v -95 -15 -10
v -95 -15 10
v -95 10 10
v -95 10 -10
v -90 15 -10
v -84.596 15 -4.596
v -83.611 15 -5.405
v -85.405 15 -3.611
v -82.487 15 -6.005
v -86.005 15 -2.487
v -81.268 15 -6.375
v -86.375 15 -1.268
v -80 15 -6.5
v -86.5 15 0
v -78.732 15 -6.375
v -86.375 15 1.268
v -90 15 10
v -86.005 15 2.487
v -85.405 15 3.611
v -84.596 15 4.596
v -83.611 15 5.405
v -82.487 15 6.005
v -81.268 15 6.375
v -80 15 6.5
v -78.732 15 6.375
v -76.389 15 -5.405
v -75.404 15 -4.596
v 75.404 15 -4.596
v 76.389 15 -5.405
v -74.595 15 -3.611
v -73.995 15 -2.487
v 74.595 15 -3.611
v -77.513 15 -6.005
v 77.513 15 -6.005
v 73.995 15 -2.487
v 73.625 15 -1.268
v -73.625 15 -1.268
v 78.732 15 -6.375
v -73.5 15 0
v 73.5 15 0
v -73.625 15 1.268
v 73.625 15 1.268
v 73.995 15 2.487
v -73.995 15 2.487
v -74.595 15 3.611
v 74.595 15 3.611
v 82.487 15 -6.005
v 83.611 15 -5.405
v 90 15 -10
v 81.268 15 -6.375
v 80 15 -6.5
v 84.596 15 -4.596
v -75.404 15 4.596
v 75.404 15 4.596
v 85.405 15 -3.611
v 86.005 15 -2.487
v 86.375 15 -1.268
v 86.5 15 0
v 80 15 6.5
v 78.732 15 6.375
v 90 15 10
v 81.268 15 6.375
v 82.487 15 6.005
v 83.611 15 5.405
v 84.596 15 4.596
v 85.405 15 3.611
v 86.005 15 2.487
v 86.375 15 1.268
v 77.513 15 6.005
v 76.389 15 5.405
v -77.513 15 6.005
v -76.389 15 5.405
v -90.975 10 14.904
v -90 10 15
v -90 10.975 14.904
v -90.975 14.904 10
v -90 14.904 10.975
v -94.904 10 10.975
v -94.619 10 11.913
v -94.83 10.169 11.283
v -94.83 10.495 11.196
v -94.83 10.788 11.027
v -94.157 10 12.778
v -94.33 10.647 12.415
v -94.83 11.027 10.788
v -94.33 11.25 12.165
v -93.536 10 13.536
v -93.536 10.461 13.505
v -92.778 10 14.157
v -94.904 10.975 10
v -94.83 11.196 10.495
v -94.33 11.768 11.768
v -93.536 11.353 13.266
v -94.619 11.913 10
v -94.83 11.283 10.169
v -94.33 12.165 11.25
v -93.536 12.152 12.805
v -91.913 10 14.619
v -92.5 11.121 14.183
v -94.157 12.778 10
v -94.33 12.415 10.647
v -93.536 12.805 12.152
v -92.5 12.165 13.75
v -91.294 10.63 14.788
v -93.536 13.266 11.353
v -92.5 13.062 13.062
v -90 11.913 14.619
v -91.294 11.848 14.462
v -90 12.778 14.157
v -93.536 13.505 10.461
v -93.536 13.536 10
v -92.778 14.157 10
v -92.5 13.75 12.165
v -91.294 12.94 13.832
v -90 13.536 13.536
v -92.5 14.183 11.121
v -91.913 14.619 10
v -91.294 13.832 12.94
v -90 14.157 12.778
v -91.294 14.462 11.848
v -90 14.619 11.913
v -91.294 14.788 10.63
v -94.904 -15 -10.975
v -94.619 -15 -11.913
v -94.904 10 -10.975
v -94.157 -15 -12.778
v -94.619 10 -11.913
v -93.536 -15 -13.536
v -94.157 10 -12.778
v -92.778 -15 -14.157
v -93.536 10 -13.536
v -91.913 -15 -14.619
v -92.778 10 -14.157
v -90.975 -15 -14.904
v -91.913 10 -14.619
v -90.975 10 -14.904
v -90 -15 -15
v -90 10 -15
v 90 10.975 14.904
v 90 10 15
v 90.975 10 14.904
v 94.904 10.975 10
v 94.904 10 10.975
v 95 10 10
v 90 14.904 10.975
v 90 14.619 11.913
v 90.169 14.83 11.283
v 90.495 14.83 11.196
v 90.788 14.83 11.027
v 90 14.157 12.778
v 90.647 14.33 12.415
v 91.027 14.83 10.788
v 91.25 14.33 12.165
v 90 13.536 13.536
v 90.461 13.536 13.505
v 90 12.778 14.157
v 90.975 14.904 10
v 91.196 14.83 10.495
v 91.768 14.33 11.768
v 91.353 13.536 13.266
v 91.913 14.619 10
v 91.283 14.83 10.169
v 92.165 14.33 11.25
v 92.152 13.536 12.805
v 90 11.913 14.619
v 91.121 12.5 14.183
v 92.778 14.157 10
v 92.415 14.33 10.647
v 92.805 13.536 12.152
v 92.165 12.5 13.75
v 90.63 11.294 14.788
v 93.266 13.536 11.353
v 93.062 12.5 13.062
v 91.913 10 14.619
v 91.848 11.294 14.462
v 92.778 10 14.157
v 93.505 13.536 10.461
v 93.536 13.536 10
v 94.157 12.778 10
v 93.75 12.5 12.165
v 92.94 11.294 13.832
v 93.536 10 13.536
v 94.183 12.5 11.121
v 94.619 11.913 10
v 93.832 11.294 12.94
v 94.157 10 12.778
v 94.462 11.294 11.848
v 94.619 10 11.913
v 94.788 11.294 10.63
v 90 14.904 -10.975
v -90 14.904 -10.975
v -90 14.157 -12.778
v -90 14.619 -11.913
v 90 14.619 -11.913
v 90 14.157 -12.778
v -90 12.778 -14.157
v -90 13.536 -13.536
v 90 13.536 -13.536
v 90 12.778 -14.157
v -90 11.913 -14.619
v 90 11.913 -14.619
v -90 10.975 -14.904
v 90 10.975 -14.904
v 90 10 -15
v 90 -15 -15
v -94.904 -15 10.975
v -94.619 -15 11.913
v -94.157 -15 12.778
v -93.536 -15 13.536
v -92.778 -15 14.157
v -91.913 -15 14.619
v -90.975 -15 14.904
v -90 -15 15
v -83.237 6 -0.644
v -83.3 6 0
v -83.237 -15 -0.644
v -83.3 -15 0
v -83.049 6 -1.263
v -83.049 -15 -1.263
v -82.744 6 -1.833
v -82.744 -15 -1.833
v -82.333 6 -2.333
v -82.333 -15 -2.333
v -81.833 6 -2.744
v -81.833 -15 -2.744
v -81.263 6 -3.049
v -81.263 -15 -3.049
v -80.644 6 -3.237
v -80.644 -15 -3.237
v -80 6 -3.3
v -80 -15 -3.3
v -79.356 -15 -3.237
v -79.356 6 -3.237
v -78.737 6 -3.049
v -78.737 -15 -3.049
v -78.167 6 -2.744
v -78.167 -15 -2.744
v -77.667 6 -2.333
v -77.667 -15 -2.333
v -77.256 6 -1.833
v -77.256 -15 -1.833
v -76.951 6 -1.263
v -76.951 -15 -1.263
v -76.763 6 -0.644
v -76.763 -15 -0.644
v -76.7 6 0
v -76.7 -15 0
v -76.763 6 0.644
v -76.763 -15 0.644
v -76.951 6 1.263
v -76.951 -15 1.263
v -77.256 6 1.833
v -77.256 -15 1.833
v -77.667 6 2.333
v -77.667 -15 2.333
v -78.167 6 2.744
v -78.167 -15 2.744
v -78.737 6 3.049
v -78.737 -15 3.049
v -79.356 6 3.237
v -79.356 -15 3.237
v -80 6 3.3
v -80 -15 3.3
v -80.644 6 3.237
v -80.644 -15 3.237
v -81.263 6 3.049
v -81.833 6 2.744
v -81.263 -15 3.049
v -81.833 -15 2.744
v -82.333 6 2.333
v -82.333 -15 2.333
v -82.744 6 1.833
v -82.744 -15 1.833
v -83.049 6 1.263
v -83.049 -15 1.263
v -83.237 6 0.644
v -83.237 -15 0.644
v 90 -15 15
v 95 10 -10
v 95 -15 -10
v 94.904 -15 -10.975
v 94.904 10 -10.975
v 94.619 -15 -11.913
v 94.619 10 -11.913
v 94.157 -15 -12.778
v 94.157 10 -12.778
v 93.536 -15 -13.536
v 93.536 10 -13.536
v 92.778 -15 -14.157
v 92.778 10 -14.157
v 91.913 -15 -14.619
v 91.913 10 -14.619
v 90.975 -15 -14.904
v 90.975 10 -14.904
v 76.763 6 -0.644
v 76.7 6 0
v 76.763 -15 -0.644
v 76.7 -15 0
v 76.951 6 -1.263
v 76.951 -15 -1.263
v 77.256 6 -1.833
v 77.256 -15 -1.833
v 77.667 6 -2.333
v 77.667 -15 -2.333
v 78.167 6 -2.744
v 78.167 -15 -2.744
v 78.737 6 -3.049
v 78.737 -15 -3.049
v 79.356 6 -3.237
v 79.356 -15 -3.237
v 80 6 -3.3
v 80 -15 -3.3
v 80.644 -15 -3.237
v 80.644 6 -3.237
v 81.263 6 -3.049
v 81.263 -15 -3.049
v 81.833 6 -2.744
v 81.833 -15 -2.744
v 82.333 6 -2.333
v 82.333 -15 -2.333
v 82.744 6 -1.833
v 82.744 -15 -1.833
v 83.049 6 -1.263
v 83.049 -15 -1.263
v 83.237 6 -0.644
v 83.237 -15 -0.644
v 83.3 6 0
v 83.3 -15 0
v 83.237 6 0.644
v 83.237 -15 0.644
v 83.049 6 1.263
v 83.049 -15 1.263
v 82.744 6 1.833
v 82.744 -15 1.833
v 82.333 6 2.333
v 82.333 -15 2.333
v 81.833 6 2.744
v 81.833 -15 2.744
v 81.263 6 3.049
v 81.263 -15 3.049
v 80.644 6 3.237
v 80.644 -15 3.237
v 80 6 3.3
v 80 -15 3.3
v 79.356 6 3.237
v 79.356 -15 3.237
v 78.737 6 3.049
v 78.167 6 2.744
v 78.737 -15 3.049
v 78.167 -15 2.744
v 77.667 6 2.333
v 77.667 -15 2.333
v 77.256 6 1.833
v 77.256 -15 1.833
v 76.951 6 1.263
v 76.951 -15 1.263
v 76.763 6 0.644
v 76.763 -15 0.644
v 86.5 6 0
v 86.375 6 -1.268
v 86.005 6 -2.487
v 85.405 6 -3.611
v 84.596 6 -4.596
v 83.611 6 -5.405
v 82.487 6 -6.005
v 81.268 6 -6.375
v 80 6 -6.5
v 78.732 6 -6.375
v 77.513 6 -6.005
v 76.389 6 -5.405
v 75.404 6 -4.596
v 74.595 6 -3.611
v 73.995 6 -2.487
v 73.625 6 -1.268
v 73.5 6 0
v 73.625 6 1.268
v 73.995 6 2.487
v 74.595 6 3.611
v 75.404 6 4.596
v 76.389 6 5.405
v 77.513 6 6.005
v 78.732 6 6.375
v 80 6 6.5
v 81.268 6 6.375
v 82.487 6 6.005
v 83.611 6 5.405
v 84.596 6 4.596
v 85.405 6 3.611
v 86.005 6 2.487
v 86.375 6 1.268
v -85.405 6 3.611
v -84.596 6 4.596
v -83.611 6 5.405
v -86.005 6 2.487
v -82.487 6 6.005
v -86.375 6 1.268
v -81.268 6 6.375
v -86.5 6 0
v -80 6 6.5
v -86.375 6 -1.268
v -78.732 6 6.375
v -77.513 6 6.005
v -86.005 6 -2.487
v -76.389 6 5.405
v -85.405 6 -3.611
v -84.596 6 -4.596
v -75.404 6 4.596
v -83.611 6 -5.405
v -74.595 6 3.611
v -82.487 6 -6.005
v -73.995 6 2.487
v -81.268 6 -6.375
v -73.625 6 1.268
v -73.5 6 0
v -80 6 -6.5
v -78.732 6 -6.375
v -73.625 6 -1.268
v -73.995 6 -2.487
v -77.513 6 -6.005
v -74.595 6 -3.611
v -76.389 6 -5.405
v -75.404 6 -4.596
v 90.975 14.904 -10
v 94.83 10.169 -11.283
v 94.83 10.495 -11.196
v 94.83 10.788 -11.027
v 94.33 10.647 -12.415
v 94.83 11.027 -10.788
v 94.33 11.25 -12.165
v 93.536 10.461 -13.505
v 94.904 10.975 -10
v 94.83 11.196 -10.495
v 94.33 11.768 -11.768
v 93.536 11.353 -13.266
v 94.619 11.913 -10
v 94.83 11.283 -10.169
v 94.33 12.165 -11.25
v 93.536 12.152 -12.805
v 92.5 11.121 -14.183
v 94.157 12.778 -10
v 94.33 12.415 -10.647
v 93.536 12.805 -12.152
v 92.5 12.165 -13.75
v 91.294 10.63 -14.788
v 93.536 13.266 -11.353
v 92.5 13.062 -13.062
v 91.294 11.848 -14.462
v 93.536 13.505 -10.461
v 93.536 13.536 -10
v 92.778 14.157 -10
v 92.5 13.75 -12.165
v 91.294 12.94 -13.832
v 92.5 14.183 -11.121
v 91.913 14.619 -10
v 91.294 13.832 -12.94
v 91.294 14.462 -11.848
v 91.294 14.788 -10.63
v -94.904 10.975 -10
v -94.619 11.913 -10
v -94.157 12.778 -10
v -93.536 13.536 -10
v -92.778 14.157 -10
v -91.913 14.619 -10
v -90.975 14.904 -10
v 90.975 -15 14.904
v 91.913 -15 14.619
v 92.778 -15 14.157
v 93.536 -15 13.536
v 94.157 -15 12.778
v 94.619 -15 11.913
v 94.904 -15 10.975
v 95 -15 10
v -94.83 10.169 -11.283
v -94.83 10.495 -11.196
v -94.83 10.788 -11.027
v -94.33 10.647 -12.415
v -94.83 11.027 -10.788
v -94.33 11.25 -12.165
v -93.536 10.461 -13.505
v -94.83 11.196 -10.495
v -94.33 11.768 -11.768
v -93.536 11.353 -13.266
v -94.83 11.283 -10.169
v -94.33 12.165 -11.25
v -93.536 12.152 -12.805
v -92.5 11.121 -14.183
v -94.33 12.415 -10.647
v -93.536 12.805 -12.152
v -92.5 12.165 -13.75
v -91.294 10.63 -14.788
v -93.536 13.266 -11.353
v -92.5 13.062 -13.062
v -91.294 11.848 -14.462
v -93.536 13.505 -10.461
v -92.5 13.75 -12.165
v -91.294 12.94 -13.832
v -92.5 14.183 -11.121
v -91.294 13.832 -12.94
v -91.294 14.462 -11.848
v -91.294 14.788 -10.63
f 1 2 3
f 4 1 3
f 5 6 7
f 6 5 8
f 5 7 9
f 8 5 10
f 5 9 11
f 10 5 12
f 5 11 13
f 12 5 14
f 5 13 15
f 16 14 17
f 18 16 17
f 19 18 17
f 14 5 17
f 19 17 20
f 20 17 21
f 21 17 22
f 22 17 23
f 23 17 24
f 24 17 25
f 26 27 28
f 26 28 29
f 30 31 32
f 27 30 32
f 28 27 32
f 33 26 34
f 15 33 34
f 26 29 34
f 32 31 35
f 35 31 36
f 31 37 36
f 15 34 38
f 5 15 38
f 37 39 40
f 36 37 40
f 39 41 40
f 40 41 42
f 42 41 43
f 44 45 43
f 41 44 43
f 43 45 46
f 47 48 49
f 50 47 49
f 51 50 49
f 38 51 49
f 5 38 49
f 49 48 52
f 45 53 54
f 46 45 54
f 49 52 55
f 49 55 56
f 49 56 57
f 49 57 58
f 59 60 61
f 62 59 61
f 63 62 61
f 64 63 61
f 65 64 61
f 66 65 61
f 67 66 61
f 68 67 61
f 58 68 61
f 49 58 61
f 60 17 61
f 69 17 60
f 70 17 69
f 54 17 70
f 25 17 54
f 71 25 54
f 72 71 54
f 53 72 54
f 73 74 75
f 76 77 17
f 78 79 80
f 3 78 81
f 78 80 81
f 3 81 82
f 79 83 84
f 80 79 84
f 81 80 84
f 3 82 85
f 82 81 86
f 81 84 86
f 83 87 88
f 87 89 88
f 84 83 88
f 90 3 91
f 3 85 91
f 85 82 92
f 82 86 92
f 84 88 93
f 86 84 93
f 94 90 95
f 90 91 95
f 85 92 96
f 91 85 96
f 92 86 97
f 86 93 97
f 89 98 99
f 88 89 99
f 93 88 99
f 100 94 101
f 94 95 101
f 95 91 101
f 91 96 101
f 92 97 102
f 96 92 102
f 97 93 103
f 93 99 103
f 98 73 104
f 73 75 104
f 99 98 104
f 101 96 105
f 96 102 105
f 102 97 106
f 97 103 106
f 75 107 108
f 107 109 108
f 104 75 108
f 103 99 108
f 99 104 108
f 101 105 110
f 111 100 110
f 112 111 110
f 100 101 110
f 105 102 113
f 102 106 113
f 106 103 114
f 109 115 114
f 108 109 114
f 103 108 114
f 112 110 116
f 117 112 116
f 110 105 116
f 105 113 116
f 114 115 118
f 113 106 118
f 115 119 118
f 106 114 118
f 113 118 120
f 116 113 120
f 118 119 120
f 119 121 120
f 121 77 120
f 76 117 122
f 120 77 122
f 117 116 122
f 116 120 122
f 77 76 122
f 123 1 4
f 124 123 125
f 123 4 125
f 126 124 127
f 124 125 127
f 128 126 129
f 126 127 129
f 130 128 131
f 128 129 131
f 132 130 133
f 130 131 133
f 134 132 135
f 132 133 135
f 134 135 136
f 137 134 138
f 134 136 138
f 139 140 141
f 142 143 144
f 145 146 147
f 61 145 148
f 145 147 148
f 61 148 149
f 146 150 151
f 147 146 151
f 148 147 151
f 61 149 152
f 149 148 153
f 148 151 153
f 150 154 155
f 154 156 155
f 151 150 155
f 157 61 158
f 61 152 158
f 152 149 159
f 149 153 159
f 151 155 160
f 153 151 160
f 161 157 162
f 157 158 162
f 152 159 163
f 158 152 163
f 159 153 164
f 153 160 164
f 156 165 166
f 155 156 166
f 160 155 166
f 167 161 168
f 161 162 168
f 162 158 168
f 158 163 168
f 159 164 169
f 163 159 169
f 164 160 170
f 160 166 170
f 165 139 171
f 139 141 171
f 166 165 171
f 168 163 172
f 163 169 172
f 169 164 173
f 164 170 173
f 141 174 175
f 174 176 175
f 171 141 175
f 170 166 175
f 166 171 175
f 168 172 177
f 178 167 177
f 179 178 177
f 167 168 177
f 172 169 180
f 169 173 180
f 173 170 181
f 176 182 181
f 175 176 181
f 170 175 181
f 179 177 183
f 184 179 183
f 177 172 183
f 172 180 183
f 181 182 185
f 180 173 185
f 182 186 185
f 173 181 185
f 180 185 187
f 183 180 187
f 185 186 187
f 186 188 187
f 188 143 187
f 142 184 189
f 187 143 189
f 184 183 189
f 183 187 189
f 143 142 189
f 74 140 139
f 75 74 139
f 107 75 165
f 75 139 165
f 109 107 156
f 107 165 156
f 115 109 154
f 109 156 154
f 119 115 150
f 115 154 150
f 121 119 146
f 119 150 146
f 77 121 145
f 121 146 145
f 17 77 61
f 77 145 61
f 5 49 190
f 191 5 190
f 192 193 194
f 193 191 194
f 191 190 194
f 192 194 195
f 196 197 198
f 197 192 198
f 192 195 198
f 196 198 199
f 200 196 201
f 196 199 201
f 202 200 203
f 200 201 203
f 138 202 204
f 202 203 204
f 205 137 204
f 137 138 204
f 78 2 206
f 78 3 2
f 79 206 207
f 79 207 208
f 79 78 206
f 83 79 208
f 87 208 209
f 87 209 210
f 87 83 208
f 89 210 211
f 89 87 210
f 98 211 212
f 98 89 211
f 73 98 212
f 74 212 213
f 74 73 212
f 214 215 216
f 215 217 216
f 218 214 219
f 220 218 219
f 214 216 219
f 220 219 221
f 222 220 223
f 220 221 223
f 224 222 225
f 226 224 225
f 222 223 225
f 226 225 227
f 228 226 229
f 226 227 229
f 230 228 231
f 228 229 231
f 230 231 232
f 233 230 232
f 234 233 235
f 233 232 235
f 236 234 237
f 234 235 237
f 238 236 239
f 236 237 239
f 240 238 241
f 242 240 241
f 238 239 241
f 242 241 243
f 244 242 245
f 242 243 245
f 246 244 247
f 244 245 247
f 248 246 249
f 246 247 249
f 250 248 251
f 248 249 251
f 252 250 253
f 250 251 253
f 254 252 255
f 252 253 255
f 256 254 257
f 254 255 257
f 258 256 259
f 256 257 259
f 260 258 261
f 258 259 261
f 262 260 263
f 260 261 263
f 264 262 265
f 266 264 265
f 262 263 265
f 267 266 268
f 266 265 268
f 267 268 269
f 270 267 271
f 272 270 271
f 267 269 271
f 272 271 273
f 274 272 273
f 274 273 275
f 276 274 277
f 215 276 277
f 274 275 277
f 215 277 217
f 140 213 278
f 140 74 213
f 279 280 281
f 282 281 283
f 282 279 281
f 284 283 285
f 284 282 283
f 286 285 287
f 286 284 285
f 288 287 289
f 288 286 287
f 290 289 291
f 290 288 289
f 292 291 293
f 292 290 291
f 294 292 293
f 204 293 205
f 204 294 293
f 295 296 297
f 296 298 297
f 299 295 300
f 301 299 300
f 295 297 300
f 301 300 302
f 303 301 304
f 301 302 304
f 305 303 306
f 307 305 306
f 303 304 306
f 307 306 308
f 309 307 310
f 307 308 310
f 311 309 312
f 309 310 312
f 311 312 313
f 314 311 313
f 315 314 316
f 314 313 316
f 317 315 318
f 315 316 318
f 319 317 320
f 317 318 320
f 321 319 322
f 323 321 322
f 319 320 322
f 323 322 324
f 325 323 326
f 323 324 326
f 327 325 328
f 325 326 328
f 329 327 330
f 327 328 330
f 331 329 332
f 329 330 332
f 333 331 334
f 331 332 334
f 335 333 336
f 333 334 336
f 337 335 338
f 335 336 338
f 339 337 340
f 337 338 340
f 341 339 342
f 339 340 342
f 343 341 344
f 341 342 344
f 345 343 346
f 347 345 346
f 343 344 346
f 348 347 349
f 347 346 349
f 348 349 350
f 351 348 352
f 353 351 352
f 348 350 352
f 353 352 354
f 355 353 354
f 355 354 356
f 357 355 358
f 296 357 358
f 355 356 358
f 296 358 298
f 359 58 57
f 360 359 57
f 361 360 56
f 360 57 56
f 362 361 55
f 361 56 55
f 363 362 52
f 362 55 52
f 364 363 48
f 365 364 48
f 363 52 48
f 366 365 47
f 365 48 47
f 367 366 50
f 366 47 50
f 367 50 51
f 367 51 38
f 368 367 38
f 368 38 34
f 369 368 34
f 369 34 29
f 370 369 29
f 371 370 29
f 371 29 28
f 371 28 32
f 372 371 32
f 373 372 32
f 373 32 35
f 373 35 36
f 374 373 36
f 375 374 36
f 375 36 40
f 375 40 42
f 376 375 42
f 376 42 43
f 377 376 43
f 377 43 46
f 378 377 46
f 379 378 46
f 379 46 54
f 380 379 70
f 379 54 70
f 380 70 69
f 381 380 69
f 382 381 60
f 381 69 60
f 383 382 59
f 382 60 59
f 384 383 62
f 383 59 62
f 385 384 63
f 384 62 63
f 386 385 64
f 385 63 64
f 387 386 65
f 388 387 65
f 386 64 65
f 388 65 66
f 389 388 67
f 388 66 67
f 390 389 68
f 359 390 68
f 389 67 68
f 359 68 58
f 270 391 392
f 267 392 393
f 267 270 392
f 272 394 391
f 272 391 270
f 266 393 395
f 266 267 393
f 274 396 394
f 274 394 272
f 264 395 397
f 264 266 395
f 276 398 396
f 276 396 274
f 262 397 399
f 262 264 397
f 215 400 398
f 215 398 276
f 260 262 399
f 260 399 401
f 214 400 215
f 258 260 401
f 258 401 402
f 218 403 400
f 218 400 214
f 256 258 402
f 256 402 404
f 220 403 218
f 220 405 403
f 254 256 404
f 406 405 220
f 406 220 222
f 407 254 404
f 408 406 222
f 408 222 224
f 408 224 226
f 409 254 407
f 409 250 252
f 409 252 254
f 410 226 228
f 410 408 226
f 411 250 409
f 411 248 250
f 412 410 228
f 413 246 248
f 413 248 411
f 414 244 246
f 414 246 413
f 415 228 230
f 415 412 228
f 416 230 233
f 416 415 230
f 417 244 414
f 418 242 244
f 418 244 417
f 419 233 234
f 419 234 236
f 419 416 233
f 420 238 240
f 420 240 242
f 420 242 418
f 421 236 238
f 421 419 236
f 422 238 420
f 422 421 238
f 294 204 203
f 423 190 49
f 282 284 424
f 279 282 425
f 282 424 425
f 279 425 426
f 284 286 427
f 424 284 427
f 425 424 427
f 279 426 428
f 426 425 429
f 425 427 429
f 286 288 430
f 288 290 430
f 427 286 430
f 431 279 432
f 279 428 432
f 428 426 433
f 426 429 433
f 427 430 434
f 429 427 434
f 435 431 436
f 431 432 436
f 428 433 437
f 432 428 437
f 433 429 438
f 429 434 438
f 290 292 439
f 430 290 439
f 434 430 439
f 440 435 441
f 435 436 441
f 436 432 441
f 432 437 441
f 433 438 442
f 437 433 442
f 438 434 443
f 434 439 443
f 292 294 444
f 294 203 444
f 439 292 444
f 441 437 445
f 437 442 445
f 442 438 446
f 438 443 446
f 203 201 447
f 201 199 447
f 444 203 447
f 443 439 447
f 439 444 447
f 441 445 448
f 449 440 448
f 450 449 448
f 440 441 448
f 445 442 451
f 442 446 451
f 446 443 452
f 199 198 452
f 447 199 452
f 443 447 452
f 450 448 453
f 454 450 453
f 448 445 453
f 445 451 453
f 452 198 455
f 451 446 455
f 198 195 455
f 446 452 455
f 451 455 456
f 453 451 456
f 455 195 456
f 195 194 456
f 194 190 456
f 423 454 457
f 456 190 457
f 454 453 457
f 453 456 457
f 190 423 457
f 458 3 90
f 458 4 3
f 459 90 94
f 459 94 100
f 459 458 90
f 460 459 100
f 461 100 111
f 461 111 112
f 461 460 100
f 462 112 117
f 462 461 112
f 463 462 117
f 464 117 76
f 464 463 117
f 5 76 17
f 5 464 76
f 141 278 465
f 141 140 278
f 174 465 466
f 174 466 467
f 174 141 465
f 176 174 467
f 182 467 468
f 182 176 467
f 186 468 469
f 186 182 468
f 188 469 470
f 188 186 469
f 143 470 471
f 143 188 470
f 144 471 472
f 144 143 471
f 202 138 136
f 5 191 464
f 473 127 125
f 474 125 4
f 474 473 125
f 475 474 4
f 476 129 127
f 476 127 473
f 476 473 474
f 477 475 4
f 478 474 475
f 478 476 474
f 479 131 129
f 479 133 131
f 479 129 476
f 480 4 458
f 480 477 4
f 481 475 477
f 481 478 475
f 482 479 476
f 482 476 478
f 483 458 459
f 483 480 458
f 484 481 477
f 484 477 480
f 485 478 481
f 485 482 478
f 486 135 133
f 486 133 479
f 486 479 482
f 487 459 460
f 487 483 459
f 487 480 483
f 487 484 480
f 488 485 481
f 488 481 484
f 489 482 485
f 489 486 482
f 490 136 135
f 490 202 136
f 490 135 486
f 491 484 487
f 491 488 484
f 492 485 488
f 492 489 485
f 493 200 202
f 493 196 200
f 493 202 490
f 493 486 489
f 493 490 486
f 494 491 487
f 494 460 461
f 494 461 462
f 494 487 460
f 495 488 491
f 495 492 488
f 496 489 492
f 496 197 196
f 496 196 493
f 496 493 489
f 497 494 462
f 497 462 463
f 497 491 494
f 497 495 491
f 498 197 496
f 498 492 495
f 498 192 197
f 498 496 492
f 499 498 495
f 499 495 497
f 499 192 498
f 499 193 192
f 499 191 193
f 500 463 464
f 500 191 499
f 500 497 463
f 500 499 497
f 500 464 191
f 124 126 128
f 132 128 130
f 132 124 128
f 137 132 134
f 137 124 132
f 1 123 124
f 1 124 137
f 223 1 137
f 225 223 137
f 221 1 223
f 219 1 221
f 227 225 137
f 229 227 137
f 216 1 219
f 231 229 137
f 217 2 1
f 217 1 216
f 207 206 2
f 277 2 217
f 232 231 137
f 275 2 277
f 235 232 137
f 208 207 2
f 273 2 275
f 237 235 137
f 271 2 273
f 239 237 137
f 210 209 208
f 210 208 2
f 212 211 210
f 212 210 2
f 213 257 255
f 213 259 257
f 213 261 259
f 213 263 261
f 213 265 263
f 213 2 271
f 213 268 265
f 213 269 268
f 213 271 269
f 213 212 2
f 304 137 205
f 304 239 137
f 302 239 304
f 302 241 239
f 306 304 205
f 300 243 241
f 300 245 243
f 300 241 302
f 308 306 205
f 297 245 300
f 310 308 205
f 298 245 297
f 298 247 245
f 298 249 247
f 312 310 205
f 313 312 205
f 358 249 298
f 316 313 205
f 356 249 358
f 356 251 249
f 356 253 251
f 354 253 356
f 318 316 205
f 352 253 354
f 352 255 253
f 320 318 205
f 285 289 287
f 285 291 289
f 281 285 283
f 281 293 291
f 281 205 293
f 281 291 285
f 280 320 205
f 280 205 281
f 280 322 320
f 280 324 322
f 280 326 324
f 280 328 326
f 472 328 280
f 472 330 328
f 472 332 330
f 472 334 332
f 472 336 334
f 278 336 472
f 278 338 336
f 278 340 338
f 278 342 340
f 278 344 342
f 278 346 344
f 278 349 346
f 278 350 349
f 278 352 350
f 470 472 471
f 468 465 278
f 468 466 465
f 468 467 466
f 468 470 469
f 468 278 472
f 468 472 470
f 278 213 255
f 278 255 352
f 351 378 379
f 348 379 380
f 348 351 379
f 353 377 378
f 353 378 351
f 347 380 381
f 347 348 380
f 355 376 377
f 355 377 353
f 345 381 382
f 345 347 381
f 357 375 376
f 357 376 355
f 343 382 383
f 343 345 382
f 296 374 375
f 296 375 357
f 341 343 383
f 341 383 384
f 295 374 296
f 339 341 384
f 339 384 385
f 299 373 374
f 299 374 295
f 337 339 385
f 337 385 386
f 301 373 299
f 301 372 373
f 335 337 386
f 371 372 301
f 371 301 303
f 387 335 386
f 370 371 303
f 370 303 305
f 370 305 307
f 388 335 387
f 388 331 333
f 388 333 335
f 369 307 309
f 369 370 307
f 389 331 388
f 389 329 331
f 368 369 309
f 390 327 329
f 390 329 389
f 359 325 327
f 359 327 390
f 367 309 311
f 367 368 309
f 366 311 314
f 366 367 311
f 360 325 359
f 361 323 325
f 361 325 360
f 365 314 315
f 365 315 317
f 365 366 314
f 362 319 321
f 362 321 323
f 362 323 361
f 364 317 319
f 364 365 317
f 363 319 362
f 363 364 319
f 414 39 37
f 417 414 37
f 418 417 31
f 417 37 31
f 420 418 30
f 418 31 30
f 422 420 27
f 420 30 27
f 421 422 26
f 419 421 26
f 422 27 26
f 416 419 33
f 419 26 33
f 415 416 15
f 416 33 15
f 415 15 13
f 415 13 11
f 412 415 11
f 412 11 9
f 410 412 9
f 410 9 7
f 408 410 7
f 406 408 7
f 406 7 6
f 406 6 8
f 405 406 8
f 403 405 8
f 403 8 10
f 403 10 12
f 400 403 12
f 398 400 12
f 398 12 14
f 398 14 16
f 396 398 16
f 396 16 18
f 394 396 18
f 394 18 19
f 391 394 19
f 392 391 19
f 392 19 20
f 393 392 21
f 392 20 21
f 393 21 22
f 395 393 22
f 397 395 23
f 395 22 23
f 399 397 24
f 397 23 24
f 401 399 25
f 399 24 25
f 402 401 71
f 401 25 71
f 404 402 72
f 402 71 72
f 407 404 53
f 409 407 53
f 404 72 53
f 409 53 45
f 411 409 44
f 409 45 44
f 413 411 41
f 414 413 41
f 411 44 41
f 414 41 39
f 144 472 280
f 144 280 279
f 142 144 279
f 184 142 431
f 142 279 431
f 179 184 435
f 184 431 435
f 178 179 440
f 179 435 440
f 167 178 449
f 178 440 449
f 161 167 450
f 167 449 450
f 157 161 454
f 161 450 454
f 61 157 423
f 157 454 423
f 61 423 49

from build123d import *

# Parameters (mm, degrees)
SKETCH1_W                                           = 190
SKETCH1_H                                           = 30
BOSS_EXTRUDE1_DEPTH                                 = 15
FILLET3_R                                           = 5
CBORE_FOR_M6_HEX_SOCKET_HEAD_CAP_SCREW1_D           = 6.6
CBORE_FOR_M6_HEX_SOCKET_HEAD_CAP_SCREW1_CBORE_D     = 13
CBORE_FOR_M6_HEX_SOCKET_HEAD_CAP_SCREW1_CBORE_DEPTH = 9


with BuildPart() as part:
    # Sketch1 → Boss-Extrude1 (new, symmetric)
    with BuildSketch(Plane.XY):
        Rectangle(SKETCH1_W, SKETCH1_H)
    extrude(amount=BOSS_EXTRUDE1_DEPTH, both=True)

    # Fillet3
    fillet3_edges = [part.edges().sort_by_distance(p)[0] for p in [
        (95, 0, 15),
        (0, 15, 15),
        (-95, 0, 15),
        (0, 15, -15),
        (95, 0, -15),
        (-95, 0, -15),
        (-95, 15, 0),
        (95, 15, 0),
    ]]
    fillet(fillet3_edges, radius=FILLET3_R)

    # CBORE for M6 Hex Socket Head Cap Screw1 (through all)
    with Locations(Plane(origin=(0, 15, 0), x_dir=(1, 0, 0), z_dir=(0, 1, 0))):
        with Locations((-80, 0), (80, 0)):
            CounterBoreHole(CBORE_FOR_M6_HEX_SOCKET_HEAD_CAP_SCREW1_D / 2, CBORE_FOR_M6_HEX_SOCKET_HEAD_CAP_SCREW1_CBORE_D / 2, CBORE_FOR_M6_HEX_SOCKET_HEAD_CAP_SCREW1_CBORE_DEPTH)


solid = part.part
